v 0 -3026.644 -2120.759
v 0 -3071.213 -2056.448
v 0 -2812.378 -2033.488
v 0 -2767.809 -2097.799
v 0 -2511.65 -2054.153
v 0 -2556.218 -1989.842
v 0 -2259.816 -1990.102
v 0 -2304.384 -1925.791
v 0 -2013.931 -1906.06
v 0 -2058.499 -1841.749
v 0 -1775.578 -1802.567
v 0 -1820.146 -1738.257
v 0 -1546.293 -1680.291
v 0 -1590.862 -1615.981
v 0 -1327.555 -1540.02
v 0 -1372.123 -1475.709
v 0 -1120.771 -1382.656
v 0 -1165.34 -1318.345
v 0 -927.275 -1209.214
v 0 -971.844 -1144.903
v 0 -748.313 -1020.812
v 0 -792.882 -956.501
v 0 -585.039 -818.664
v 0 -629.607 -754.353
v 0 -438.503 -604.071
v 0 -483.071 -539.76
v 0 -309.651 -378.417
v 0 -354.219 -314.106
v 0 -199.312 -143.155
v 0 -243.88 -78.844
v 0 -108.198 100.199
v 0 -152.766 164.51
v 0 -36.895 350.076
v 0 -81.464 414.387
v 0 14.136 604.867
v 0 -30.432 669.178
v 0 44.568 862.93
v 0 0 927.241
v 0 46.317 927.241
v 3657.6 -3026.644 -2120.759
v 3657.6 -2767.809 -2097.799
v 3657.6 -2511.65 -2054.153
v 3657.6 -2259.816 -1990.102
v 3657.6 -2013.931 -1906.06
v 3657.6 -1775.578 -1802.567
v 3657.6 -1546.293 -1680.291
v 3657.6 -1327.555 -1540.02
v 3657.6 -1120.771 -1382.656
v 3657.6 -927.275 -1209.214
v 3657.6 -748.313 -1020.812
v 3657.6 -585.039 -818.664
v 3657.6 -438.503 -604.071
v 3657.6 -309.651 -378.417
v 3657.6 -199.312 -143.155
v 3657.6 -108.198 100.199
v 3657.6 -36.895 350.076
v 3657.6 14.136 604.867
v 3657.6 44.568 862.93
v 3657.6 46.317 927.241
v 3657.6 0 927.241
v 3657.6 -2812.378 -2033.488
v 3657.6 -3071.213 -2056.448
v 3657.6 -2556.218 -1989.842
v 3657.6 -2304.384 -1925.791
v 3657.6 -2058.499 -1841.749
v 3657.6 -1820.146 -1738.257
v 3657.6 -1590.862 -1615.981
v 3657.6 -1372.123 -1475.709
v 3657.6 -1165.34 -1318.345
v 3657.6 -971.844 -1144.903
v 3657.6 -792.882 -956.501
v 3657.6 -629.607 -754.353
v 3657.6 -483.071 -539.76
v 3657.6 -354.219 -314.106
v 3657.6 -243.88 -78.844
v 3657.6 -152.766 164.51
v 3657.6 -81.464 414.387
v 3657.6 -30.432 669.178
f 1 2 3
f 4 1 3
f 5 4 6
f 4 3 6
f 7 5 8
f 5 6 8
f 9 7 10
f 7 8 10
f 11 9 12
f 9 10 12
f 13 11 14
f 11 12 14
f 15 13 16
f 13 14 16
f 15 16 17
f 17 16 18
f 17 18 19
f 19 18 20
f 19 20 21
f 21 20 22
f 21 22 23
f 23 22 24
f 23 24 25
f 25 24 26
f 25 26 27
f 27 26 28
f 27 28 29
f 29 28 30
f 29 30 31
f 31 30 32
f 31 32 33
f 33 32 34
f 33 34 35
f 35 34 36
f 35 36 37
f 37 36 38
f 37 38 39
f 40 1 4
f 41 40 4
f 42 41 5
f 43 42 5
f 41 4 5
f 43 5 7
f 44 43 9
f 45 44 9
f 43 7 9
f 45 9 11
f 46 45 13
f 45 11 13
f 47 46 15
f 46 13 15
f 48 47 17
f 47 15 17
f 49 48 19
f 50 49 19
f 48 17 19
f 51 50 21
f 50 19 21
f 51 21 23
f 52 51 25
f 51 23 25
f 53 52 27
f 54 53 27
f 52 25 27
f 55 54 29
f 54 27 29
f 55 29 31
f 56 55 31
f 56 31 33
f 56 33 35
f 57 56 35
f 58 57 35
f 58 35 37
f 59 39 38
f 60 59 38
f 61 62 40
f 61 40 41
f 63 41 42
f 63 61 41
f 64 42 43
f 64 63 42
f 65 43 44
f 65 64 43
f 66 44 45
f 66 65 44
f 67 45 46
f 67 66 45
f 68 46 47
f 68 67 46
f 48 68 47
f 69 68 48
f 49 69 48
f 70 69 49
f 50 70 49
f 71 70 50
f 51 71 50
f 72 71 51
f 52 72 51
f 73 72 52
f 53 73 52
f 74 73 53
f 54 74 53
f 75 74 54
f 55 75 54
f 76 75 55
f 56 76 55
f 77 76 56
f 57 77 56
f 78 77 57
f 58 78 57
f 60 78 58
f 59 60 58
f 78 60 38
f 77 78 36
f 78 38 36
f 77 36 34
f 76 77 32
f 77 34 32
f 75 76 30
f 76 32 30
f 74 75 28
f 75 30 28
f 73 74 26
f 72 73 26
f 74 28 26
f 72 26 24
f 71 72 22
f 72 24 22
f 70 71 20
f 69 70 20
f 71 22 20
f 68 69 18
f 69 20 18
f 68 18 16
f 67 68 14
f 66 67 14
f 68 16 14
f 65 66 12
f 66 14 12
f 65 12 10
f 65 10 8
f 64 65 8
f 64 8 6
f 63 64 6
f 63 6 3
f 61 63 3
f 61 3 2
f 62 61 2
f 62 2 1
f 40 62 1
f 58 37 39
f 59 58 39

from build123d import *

# Parameters (mm, degrees)
F1_DEPTH = 3657.6


with BuildPart() as f1:
    # F0 (on Right) → F1 (new body)
    with BuildSketch(Plane.YZ):
        with BuildLine():
            ThreePointArc((0, 927.241276), (-971.843552, -1144.903488), (-3071.212648, -2056.447898))
            Line((-3071.212648, -2056.447898), (-3026.644405, -2120.758724))
            ThreePointArc((-3026.644405, -2120.758724), (-927.275308, -1209.214314), (44.568244, 862.93045))
            Line((44.568244, 862.93045), (46.316882, 927.241276))
            Line((46.316882, 927.241276), (0, 927.241276))
        make_face()
    extrude(amount=F1_DEPTH)


solid = f1.part
